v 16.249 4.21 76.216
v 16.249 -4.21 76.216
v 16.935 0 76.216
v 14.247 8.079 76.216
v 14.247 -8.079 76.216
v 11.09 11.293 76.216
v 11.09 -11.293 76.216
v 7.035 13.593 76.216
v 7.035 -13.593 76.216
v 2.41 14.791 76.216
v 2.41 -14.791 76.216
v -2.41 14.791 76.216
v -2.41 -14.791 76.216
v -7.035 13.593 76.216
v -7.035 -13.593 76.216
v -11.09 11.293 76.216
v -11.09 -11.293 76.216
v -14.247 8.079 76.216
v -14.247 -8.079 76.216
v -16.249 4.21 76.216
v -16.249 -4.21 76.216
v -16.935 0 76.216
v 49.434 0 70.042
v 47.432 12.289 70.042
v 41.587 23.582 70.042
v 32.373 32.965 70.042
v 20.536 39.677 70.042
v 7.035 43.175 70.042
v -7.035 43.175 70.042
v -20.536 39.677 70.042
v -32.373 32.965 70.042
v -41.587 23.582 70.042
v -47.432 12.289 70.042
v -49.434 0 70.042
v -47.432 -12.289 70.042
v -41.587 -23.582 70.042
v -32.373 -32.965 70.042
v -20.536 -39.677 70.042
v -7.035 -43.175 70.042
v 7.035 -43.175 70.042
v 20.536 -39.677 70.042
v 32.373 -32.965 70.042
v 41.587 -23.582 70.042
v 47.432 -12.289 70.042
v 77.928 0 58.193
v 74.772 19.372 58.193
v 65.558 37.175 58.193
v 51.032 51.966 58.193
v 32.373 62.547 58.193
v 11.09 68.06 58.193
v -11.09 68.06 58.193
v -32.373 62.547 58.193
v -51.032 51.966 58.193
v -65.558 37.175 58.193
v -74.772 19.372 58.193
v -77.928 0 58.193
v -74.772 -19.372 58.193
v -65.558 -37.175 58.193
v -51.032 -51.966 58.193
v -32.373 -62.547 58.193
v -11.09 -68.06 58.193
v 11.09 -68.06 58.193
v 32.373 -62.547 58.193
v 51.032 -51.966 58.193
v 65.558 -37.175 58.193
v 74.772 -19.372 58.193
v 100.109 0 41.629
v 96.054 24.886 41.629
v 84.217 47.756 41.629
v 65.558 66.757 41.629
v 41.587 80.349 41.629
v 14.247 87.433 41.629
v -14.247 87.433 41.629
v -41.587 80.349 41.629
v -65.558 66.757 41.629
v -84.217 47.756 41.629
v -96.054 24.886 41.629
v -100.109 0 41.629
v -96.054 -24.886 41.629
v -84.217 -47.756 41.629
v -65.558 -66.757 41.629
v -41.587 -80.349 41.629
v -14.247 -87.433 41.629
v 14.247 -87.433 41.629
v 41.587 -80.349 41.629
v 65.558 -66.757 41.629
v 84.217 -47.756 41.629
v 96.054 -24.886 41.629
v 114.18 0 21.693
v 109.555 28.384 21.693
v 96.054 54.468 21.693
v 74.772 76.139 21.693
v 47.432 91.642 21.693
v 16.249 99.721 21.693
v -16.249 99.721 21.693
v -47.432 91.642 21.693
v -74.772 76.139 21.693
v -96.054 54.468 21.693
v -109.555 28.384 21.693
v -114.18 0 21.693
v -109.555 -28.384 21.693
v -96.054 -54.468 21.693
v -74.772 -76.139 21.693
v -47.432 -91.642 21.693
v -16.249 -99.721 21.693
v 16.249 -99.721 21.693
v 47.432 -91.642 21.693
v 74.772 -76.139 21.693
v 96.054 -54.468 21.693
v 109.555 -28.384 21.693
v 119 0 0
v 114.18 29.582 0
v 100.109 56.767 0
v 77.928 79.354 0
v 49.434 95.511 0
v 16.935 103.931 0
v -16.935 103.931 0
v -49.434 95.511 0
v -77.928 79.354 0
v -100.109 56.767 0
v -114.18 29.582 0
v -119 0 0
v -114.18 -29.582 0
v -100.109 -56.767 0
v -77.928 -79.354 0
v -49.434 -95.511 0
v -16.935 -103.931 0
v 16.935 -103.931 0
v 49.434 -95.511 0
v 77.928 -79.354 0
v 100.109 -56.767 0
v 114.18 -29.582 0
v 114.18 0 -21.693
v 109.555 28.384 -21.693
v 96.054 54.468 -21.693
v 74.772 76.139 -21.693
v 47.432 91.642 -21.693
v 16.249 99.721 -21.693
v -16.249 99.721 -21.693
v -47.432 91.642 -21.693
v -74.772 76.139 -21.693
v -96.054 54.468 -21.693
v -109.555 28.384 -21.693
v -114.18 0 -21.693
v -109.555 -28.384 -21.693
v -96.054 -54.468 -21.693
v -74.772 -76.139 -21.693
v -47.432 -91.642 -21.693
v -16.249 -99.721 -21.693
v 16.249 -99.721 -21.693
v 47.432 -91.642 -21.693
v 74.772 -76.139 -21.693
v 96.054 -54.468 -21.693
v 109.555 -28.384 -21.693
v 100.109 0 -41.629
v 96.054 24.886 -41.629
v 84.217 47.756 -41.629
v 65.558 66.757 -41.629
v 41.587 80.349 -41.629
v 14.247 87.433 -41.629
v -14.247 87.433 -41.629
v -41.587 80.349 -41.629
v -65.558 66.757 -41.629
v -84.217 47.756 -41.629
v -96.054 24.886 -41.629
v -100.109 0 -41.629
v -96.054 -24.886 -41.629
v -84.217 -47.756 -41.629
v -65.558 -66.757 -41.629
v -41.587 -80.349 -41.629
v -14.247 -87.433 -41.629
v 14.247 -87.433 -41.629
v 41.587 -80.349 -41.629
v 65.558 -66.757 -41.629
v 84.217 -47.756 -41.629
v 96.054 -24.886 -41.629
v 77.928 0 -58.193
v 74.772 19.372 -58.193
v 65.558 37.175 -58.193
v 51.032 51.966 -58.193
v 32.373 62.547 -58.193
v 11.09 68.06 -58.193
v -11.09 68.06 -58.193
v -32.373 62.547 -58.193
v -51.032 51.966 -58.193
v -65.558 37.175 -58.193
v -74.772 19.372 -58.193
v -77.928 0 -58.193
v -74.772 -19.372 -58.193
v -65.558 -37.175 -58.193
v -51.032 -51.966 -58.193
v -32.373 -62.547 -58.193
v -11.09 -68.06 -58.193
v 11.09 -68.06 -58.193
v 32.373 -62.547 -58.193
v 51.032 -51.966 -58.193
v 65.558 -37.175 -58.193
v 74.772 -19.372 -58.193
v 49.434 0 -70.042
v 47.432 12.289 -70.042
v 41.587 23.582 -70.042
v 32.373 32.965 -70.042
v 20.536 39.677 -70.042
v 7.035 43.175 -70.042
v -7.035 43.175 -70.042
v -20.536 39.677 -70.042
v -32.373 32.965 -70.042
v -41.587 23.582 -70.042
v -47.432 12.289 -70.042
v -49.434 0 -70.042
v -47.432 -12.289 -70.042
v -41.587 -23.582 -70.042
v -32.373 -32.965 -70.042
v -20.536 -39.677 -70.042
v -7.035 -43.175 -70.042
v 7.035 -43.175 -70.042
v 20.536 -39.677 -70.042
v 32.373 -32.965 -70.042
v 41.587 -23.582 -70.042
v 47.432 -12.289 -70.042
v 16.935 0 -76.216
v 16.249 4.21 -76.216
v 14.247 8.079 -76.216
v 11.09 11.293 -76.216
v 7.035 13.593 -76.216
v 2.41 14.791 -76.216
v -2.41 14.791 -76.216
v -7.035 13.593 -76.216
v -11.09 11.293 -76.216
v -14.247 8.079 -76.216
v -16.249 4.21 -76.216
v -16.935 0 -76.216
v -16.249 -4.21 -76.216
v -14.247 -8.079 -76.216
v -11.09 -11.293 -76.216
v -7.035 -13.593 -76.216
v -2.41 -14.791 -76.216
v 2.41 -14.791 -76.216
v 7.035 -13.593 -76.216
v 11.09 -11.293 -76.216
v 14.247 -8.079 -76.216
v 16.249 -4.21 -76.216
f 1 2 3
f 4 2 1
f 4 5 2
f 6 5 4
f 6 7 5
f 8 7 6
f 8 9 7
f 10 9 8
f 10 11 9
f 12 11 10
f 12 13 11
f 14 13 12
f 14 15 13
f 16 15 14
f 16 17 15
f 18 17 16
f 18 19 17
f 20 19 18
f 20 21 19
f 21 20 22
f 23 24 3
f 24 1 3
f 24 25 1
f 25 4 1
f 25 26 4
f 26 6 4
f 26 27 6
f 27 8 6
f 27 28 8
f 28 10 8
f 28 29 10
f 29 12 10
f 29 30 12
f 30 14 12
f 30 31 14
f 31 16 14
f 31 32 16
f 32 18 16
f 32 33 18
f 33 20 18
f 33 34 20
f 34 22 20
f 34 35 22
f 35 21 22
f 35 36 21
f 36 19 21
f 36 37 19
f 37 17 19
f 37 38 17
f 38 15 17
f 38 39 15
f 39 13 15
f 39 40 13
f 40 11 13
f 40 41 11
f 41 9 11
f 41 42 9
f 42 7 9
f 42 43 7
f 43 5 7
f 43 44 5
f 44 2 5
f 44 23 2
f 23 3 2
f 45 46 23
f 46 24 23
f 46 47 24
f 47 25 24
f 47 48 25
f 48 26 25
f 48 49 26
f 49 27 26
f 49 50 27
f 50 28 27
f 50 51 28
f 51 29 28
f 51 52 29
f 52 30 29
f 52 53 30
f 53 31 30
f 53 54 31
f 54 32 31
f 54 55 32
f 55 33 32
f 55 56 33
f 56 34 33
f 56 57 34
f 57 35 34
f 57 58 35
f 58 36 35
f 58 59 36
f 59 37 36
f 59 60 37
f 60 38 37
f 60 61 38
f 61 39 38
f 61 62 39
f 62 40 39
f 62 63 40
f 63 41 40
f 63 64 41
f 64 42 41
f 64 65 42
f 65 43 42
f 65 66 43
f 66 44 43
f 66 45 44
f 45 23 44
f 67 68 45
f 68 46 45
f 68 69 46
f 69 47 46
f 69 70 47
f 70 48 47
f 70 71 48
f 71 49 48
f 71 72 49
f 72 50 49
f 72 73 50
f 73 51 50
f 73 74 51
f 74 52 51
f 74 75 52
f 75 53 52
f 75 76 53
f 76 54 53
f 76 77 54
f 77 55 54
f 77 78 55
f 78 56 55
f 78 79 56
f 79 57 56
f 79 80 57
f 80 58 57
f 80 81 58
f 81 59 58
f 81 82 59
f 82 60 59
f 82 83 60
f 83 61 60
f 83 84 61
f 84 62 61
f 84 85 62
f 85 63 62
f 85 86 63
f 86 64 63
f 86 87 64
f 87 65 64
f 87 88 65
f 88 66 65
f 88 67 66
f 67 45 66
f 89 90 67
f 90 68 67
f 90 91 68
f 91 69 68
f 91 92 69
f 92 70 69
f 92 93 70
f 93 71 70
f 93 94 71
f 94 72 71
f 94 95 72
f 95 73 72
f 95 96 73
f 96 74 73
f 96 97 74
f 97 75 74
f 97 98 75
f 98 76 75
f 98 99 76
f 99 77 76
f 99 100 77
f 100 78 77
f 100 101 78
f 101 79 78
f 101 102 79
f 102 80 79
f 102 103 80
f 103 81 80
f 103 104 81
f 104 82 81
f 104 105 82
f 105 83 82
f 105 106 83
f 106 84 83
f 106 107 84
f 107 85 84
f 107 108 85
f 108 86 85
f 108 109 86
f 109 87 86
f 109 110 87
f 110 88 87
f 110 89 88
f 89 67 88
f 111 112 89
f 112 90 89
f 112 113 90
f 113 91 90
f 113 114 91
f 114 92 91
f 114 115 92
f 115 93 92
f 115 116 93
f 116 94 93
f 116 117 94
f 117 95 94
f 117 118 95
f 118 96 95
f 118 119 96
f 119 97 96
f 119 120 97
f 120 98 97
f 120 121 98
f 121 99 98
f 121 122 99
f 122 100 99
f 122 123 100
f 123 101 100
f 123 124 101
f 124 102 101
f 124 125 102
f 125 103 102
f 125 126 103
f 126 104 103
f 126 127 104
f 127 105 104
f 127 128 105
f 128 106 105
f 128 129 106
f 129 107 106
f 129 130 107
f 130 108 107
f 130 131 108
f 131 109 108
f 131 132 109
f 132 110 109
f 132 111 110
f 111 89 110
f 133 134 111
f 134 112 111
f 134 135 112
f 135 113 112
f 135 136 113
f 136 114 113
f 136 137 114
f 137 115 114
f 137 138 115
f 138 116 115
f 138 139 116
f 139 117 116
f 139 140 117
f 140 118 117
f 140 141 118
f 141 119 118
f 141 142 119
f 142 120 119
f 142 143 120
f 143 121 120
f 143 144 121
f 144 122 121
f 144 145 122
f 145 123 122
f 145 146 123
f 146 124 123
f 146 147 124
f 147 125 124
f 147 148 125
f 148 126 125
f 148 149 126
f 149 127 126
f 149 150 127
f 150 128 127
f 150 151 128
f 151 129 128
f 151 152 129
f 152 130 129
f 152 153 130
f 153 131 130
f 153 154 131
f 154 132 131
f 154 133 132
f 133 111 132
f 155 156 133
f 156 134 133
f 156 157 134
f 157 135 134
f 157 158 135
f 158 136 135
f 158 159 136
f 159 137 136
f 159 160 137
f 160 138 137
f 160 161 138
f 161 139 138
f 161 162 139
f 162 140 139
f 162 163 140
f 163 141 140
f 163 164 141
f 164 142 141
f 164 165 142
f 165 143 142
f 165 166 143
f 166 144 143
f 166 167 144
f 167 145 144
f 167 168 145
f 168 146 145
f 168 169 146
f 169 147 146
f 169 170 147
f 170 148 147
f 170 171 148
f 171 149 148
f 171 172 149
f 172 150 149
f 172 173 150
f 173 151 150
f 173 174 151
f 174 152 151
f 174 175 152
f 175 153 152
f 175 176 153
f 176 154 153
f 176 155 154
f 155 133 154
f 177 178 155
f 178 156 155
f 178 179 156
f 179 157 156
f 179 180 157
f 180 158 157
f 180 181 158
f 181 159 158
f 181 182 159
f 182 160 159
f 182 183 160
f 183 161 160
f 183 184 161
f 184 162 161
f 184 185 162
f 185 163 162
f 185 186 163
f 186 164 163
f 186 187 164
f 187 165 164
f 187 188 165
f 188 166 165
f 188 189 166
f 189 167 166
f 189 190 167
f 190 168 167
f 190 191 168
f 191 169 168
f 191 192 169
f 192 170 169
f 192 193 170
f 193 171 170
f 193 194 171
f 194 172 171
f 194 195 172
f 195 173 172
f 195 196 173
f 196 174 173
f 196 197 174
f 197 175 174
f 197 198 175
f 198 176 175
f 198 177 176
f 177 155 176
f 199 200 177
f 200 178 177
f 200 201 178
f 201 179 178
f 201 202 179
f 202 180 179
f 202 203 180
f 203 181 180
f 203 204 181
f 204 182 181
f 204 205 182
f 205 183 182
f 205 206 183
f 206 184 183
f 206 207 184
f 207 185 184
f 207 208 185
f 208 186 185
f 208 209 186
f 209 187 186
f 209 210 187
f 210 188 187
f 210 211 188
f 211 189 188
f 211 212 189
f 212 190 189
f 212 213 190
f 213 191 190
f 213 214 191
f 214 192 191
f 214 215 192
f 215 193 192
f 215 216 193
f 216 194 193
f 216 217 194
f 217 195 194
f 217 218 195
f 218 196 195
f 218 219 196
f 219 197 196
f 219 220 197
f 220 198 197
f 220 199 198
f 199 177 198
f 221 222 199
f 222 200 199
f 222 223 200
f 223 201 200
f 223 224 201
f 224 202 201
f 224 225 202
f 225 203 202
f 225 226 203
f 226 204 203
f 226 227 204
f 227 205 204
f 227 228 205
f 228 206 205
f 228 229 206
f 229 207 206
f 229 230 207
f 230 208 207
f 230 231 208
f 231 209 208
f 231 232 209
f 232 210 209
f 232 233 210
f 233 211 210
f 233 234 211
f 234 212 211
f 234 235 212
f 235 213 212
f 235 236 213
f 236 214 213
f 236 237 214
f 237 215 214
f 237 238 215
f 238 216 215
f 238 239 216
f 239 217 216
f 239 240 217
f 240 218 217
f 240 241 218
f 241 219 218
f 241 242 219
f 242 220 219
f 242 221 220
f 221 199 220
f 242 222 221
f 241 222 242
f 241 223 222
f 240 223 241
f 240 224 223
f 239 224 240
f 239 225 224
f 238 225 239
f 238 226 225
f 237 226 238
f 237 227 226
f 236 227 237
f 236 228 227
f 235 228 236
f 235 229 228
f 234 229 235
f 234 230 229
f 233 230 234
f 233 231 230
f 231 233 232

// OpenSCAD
// Generated by SolidPython 1.0.1 on 2020-07-29 00:46:53


scale(v = [17, 15, 11]) {
	sphere(r = 7);
}
/***********************************************
*********      SolidPython code:      **********
************************************************
 
# import packages: SolidPython
from solid import *
from solid.utils import *
from itertools import chain, combinations, permutations


class Resize:

    def __init__(self, scad_file):
        self.scad_file = scad_file
        #self.scad_file = import_scad(scad_file)
        # cone/cylinder param:
        self.r1 = 0
        self.r2 = 0
        self.h = 0
        # rectangular prism param:
        self.w = 0
        self.l = 0
        # ellipse param:
        self.r = 0

    # import OpenScad code (file name corresponds to shape)


    # classify shape + parameters
    def assign(self, param1, param2, param3):
        if self.scad_file == 'cone.scad':
            self.r1 = param1
            self.r2 = param2
            self.h = param3
        elif self.scad_file == 'cylinder.scad':
            self.r1 = param1
            self.r2 = param2
            self.h = param3
        elif self.scad_file == 'rectangularPrism.scad':
            self.h = param1
            self.l = param2
            self.w = param3
        else:
            self.r = param1
            self.h = param2

    # resize parameters
    def iterate(self):
        x = range(3, 20, 2)
        i = 1
        if self.scad_file == 'cone.scad':
            tempList = list(permutations(x, 2))
            for temp in tempList:
                param1 = temp[0]
                param2 = temp[1]
                filepath = 'produced_scad_files/' + 'cone' + str(param1) + '_' + str(param2) + '_' + '.scad'
                scad_render_to_file(cylinder(h=param1, r1=param2, r2=0), filepath)

        elif self.scad_file == 'cylinder.scad':
            tempList = list(permutations(x, 3))
            for temp in tempList:
                param1 = temp[0]
                param2 = temp[1]
                filepath = 'produced_scad_files/' + 'cylinder' + str(param1) + '_' + str(param2) + '_' + '.scad'
                scad_render_to_file(cylinder(h=param1, r1=param2, r2=param2), filepath)

        elif self.scad_file == 'rectangularPrism.scad':
            tempList = list(permutations(x, 3))
            for temp in tempList:
                param1 = temp[0]
                param2 = temp[1]
                param3 = temp[2]
                filepath = 'produced_scad_files/' + 'rectangularPrism' + str(param1) + '_' + str(param2) + '_' + str(
                    param3) + '.scad'
                scad_render_to_file(cube(size=(param1, param2, param3)), filepath)

        elif self.scad_file == 'ellipse.scad':
            tempList = list(permutations(x, 4))
            for temp in tempList:
                param1 = temp[0]
                param2 = temp[1]
                param3 = temp[2]
                param4 = temp[3]
                filepath = 'produced_scad_files/' + 'ellipse' + str(param1) + '_' + str(param2) + '_' + str(param3) + '_' + str(param4) + '.scad'
                scad_render_to_file(scale([param1, param2, param3])(sphere(r=param4)), filepath)

    def render_to_scadfile(self):
        scad_render_to_file(scad, 'example.scad') 
 
************************************************/
